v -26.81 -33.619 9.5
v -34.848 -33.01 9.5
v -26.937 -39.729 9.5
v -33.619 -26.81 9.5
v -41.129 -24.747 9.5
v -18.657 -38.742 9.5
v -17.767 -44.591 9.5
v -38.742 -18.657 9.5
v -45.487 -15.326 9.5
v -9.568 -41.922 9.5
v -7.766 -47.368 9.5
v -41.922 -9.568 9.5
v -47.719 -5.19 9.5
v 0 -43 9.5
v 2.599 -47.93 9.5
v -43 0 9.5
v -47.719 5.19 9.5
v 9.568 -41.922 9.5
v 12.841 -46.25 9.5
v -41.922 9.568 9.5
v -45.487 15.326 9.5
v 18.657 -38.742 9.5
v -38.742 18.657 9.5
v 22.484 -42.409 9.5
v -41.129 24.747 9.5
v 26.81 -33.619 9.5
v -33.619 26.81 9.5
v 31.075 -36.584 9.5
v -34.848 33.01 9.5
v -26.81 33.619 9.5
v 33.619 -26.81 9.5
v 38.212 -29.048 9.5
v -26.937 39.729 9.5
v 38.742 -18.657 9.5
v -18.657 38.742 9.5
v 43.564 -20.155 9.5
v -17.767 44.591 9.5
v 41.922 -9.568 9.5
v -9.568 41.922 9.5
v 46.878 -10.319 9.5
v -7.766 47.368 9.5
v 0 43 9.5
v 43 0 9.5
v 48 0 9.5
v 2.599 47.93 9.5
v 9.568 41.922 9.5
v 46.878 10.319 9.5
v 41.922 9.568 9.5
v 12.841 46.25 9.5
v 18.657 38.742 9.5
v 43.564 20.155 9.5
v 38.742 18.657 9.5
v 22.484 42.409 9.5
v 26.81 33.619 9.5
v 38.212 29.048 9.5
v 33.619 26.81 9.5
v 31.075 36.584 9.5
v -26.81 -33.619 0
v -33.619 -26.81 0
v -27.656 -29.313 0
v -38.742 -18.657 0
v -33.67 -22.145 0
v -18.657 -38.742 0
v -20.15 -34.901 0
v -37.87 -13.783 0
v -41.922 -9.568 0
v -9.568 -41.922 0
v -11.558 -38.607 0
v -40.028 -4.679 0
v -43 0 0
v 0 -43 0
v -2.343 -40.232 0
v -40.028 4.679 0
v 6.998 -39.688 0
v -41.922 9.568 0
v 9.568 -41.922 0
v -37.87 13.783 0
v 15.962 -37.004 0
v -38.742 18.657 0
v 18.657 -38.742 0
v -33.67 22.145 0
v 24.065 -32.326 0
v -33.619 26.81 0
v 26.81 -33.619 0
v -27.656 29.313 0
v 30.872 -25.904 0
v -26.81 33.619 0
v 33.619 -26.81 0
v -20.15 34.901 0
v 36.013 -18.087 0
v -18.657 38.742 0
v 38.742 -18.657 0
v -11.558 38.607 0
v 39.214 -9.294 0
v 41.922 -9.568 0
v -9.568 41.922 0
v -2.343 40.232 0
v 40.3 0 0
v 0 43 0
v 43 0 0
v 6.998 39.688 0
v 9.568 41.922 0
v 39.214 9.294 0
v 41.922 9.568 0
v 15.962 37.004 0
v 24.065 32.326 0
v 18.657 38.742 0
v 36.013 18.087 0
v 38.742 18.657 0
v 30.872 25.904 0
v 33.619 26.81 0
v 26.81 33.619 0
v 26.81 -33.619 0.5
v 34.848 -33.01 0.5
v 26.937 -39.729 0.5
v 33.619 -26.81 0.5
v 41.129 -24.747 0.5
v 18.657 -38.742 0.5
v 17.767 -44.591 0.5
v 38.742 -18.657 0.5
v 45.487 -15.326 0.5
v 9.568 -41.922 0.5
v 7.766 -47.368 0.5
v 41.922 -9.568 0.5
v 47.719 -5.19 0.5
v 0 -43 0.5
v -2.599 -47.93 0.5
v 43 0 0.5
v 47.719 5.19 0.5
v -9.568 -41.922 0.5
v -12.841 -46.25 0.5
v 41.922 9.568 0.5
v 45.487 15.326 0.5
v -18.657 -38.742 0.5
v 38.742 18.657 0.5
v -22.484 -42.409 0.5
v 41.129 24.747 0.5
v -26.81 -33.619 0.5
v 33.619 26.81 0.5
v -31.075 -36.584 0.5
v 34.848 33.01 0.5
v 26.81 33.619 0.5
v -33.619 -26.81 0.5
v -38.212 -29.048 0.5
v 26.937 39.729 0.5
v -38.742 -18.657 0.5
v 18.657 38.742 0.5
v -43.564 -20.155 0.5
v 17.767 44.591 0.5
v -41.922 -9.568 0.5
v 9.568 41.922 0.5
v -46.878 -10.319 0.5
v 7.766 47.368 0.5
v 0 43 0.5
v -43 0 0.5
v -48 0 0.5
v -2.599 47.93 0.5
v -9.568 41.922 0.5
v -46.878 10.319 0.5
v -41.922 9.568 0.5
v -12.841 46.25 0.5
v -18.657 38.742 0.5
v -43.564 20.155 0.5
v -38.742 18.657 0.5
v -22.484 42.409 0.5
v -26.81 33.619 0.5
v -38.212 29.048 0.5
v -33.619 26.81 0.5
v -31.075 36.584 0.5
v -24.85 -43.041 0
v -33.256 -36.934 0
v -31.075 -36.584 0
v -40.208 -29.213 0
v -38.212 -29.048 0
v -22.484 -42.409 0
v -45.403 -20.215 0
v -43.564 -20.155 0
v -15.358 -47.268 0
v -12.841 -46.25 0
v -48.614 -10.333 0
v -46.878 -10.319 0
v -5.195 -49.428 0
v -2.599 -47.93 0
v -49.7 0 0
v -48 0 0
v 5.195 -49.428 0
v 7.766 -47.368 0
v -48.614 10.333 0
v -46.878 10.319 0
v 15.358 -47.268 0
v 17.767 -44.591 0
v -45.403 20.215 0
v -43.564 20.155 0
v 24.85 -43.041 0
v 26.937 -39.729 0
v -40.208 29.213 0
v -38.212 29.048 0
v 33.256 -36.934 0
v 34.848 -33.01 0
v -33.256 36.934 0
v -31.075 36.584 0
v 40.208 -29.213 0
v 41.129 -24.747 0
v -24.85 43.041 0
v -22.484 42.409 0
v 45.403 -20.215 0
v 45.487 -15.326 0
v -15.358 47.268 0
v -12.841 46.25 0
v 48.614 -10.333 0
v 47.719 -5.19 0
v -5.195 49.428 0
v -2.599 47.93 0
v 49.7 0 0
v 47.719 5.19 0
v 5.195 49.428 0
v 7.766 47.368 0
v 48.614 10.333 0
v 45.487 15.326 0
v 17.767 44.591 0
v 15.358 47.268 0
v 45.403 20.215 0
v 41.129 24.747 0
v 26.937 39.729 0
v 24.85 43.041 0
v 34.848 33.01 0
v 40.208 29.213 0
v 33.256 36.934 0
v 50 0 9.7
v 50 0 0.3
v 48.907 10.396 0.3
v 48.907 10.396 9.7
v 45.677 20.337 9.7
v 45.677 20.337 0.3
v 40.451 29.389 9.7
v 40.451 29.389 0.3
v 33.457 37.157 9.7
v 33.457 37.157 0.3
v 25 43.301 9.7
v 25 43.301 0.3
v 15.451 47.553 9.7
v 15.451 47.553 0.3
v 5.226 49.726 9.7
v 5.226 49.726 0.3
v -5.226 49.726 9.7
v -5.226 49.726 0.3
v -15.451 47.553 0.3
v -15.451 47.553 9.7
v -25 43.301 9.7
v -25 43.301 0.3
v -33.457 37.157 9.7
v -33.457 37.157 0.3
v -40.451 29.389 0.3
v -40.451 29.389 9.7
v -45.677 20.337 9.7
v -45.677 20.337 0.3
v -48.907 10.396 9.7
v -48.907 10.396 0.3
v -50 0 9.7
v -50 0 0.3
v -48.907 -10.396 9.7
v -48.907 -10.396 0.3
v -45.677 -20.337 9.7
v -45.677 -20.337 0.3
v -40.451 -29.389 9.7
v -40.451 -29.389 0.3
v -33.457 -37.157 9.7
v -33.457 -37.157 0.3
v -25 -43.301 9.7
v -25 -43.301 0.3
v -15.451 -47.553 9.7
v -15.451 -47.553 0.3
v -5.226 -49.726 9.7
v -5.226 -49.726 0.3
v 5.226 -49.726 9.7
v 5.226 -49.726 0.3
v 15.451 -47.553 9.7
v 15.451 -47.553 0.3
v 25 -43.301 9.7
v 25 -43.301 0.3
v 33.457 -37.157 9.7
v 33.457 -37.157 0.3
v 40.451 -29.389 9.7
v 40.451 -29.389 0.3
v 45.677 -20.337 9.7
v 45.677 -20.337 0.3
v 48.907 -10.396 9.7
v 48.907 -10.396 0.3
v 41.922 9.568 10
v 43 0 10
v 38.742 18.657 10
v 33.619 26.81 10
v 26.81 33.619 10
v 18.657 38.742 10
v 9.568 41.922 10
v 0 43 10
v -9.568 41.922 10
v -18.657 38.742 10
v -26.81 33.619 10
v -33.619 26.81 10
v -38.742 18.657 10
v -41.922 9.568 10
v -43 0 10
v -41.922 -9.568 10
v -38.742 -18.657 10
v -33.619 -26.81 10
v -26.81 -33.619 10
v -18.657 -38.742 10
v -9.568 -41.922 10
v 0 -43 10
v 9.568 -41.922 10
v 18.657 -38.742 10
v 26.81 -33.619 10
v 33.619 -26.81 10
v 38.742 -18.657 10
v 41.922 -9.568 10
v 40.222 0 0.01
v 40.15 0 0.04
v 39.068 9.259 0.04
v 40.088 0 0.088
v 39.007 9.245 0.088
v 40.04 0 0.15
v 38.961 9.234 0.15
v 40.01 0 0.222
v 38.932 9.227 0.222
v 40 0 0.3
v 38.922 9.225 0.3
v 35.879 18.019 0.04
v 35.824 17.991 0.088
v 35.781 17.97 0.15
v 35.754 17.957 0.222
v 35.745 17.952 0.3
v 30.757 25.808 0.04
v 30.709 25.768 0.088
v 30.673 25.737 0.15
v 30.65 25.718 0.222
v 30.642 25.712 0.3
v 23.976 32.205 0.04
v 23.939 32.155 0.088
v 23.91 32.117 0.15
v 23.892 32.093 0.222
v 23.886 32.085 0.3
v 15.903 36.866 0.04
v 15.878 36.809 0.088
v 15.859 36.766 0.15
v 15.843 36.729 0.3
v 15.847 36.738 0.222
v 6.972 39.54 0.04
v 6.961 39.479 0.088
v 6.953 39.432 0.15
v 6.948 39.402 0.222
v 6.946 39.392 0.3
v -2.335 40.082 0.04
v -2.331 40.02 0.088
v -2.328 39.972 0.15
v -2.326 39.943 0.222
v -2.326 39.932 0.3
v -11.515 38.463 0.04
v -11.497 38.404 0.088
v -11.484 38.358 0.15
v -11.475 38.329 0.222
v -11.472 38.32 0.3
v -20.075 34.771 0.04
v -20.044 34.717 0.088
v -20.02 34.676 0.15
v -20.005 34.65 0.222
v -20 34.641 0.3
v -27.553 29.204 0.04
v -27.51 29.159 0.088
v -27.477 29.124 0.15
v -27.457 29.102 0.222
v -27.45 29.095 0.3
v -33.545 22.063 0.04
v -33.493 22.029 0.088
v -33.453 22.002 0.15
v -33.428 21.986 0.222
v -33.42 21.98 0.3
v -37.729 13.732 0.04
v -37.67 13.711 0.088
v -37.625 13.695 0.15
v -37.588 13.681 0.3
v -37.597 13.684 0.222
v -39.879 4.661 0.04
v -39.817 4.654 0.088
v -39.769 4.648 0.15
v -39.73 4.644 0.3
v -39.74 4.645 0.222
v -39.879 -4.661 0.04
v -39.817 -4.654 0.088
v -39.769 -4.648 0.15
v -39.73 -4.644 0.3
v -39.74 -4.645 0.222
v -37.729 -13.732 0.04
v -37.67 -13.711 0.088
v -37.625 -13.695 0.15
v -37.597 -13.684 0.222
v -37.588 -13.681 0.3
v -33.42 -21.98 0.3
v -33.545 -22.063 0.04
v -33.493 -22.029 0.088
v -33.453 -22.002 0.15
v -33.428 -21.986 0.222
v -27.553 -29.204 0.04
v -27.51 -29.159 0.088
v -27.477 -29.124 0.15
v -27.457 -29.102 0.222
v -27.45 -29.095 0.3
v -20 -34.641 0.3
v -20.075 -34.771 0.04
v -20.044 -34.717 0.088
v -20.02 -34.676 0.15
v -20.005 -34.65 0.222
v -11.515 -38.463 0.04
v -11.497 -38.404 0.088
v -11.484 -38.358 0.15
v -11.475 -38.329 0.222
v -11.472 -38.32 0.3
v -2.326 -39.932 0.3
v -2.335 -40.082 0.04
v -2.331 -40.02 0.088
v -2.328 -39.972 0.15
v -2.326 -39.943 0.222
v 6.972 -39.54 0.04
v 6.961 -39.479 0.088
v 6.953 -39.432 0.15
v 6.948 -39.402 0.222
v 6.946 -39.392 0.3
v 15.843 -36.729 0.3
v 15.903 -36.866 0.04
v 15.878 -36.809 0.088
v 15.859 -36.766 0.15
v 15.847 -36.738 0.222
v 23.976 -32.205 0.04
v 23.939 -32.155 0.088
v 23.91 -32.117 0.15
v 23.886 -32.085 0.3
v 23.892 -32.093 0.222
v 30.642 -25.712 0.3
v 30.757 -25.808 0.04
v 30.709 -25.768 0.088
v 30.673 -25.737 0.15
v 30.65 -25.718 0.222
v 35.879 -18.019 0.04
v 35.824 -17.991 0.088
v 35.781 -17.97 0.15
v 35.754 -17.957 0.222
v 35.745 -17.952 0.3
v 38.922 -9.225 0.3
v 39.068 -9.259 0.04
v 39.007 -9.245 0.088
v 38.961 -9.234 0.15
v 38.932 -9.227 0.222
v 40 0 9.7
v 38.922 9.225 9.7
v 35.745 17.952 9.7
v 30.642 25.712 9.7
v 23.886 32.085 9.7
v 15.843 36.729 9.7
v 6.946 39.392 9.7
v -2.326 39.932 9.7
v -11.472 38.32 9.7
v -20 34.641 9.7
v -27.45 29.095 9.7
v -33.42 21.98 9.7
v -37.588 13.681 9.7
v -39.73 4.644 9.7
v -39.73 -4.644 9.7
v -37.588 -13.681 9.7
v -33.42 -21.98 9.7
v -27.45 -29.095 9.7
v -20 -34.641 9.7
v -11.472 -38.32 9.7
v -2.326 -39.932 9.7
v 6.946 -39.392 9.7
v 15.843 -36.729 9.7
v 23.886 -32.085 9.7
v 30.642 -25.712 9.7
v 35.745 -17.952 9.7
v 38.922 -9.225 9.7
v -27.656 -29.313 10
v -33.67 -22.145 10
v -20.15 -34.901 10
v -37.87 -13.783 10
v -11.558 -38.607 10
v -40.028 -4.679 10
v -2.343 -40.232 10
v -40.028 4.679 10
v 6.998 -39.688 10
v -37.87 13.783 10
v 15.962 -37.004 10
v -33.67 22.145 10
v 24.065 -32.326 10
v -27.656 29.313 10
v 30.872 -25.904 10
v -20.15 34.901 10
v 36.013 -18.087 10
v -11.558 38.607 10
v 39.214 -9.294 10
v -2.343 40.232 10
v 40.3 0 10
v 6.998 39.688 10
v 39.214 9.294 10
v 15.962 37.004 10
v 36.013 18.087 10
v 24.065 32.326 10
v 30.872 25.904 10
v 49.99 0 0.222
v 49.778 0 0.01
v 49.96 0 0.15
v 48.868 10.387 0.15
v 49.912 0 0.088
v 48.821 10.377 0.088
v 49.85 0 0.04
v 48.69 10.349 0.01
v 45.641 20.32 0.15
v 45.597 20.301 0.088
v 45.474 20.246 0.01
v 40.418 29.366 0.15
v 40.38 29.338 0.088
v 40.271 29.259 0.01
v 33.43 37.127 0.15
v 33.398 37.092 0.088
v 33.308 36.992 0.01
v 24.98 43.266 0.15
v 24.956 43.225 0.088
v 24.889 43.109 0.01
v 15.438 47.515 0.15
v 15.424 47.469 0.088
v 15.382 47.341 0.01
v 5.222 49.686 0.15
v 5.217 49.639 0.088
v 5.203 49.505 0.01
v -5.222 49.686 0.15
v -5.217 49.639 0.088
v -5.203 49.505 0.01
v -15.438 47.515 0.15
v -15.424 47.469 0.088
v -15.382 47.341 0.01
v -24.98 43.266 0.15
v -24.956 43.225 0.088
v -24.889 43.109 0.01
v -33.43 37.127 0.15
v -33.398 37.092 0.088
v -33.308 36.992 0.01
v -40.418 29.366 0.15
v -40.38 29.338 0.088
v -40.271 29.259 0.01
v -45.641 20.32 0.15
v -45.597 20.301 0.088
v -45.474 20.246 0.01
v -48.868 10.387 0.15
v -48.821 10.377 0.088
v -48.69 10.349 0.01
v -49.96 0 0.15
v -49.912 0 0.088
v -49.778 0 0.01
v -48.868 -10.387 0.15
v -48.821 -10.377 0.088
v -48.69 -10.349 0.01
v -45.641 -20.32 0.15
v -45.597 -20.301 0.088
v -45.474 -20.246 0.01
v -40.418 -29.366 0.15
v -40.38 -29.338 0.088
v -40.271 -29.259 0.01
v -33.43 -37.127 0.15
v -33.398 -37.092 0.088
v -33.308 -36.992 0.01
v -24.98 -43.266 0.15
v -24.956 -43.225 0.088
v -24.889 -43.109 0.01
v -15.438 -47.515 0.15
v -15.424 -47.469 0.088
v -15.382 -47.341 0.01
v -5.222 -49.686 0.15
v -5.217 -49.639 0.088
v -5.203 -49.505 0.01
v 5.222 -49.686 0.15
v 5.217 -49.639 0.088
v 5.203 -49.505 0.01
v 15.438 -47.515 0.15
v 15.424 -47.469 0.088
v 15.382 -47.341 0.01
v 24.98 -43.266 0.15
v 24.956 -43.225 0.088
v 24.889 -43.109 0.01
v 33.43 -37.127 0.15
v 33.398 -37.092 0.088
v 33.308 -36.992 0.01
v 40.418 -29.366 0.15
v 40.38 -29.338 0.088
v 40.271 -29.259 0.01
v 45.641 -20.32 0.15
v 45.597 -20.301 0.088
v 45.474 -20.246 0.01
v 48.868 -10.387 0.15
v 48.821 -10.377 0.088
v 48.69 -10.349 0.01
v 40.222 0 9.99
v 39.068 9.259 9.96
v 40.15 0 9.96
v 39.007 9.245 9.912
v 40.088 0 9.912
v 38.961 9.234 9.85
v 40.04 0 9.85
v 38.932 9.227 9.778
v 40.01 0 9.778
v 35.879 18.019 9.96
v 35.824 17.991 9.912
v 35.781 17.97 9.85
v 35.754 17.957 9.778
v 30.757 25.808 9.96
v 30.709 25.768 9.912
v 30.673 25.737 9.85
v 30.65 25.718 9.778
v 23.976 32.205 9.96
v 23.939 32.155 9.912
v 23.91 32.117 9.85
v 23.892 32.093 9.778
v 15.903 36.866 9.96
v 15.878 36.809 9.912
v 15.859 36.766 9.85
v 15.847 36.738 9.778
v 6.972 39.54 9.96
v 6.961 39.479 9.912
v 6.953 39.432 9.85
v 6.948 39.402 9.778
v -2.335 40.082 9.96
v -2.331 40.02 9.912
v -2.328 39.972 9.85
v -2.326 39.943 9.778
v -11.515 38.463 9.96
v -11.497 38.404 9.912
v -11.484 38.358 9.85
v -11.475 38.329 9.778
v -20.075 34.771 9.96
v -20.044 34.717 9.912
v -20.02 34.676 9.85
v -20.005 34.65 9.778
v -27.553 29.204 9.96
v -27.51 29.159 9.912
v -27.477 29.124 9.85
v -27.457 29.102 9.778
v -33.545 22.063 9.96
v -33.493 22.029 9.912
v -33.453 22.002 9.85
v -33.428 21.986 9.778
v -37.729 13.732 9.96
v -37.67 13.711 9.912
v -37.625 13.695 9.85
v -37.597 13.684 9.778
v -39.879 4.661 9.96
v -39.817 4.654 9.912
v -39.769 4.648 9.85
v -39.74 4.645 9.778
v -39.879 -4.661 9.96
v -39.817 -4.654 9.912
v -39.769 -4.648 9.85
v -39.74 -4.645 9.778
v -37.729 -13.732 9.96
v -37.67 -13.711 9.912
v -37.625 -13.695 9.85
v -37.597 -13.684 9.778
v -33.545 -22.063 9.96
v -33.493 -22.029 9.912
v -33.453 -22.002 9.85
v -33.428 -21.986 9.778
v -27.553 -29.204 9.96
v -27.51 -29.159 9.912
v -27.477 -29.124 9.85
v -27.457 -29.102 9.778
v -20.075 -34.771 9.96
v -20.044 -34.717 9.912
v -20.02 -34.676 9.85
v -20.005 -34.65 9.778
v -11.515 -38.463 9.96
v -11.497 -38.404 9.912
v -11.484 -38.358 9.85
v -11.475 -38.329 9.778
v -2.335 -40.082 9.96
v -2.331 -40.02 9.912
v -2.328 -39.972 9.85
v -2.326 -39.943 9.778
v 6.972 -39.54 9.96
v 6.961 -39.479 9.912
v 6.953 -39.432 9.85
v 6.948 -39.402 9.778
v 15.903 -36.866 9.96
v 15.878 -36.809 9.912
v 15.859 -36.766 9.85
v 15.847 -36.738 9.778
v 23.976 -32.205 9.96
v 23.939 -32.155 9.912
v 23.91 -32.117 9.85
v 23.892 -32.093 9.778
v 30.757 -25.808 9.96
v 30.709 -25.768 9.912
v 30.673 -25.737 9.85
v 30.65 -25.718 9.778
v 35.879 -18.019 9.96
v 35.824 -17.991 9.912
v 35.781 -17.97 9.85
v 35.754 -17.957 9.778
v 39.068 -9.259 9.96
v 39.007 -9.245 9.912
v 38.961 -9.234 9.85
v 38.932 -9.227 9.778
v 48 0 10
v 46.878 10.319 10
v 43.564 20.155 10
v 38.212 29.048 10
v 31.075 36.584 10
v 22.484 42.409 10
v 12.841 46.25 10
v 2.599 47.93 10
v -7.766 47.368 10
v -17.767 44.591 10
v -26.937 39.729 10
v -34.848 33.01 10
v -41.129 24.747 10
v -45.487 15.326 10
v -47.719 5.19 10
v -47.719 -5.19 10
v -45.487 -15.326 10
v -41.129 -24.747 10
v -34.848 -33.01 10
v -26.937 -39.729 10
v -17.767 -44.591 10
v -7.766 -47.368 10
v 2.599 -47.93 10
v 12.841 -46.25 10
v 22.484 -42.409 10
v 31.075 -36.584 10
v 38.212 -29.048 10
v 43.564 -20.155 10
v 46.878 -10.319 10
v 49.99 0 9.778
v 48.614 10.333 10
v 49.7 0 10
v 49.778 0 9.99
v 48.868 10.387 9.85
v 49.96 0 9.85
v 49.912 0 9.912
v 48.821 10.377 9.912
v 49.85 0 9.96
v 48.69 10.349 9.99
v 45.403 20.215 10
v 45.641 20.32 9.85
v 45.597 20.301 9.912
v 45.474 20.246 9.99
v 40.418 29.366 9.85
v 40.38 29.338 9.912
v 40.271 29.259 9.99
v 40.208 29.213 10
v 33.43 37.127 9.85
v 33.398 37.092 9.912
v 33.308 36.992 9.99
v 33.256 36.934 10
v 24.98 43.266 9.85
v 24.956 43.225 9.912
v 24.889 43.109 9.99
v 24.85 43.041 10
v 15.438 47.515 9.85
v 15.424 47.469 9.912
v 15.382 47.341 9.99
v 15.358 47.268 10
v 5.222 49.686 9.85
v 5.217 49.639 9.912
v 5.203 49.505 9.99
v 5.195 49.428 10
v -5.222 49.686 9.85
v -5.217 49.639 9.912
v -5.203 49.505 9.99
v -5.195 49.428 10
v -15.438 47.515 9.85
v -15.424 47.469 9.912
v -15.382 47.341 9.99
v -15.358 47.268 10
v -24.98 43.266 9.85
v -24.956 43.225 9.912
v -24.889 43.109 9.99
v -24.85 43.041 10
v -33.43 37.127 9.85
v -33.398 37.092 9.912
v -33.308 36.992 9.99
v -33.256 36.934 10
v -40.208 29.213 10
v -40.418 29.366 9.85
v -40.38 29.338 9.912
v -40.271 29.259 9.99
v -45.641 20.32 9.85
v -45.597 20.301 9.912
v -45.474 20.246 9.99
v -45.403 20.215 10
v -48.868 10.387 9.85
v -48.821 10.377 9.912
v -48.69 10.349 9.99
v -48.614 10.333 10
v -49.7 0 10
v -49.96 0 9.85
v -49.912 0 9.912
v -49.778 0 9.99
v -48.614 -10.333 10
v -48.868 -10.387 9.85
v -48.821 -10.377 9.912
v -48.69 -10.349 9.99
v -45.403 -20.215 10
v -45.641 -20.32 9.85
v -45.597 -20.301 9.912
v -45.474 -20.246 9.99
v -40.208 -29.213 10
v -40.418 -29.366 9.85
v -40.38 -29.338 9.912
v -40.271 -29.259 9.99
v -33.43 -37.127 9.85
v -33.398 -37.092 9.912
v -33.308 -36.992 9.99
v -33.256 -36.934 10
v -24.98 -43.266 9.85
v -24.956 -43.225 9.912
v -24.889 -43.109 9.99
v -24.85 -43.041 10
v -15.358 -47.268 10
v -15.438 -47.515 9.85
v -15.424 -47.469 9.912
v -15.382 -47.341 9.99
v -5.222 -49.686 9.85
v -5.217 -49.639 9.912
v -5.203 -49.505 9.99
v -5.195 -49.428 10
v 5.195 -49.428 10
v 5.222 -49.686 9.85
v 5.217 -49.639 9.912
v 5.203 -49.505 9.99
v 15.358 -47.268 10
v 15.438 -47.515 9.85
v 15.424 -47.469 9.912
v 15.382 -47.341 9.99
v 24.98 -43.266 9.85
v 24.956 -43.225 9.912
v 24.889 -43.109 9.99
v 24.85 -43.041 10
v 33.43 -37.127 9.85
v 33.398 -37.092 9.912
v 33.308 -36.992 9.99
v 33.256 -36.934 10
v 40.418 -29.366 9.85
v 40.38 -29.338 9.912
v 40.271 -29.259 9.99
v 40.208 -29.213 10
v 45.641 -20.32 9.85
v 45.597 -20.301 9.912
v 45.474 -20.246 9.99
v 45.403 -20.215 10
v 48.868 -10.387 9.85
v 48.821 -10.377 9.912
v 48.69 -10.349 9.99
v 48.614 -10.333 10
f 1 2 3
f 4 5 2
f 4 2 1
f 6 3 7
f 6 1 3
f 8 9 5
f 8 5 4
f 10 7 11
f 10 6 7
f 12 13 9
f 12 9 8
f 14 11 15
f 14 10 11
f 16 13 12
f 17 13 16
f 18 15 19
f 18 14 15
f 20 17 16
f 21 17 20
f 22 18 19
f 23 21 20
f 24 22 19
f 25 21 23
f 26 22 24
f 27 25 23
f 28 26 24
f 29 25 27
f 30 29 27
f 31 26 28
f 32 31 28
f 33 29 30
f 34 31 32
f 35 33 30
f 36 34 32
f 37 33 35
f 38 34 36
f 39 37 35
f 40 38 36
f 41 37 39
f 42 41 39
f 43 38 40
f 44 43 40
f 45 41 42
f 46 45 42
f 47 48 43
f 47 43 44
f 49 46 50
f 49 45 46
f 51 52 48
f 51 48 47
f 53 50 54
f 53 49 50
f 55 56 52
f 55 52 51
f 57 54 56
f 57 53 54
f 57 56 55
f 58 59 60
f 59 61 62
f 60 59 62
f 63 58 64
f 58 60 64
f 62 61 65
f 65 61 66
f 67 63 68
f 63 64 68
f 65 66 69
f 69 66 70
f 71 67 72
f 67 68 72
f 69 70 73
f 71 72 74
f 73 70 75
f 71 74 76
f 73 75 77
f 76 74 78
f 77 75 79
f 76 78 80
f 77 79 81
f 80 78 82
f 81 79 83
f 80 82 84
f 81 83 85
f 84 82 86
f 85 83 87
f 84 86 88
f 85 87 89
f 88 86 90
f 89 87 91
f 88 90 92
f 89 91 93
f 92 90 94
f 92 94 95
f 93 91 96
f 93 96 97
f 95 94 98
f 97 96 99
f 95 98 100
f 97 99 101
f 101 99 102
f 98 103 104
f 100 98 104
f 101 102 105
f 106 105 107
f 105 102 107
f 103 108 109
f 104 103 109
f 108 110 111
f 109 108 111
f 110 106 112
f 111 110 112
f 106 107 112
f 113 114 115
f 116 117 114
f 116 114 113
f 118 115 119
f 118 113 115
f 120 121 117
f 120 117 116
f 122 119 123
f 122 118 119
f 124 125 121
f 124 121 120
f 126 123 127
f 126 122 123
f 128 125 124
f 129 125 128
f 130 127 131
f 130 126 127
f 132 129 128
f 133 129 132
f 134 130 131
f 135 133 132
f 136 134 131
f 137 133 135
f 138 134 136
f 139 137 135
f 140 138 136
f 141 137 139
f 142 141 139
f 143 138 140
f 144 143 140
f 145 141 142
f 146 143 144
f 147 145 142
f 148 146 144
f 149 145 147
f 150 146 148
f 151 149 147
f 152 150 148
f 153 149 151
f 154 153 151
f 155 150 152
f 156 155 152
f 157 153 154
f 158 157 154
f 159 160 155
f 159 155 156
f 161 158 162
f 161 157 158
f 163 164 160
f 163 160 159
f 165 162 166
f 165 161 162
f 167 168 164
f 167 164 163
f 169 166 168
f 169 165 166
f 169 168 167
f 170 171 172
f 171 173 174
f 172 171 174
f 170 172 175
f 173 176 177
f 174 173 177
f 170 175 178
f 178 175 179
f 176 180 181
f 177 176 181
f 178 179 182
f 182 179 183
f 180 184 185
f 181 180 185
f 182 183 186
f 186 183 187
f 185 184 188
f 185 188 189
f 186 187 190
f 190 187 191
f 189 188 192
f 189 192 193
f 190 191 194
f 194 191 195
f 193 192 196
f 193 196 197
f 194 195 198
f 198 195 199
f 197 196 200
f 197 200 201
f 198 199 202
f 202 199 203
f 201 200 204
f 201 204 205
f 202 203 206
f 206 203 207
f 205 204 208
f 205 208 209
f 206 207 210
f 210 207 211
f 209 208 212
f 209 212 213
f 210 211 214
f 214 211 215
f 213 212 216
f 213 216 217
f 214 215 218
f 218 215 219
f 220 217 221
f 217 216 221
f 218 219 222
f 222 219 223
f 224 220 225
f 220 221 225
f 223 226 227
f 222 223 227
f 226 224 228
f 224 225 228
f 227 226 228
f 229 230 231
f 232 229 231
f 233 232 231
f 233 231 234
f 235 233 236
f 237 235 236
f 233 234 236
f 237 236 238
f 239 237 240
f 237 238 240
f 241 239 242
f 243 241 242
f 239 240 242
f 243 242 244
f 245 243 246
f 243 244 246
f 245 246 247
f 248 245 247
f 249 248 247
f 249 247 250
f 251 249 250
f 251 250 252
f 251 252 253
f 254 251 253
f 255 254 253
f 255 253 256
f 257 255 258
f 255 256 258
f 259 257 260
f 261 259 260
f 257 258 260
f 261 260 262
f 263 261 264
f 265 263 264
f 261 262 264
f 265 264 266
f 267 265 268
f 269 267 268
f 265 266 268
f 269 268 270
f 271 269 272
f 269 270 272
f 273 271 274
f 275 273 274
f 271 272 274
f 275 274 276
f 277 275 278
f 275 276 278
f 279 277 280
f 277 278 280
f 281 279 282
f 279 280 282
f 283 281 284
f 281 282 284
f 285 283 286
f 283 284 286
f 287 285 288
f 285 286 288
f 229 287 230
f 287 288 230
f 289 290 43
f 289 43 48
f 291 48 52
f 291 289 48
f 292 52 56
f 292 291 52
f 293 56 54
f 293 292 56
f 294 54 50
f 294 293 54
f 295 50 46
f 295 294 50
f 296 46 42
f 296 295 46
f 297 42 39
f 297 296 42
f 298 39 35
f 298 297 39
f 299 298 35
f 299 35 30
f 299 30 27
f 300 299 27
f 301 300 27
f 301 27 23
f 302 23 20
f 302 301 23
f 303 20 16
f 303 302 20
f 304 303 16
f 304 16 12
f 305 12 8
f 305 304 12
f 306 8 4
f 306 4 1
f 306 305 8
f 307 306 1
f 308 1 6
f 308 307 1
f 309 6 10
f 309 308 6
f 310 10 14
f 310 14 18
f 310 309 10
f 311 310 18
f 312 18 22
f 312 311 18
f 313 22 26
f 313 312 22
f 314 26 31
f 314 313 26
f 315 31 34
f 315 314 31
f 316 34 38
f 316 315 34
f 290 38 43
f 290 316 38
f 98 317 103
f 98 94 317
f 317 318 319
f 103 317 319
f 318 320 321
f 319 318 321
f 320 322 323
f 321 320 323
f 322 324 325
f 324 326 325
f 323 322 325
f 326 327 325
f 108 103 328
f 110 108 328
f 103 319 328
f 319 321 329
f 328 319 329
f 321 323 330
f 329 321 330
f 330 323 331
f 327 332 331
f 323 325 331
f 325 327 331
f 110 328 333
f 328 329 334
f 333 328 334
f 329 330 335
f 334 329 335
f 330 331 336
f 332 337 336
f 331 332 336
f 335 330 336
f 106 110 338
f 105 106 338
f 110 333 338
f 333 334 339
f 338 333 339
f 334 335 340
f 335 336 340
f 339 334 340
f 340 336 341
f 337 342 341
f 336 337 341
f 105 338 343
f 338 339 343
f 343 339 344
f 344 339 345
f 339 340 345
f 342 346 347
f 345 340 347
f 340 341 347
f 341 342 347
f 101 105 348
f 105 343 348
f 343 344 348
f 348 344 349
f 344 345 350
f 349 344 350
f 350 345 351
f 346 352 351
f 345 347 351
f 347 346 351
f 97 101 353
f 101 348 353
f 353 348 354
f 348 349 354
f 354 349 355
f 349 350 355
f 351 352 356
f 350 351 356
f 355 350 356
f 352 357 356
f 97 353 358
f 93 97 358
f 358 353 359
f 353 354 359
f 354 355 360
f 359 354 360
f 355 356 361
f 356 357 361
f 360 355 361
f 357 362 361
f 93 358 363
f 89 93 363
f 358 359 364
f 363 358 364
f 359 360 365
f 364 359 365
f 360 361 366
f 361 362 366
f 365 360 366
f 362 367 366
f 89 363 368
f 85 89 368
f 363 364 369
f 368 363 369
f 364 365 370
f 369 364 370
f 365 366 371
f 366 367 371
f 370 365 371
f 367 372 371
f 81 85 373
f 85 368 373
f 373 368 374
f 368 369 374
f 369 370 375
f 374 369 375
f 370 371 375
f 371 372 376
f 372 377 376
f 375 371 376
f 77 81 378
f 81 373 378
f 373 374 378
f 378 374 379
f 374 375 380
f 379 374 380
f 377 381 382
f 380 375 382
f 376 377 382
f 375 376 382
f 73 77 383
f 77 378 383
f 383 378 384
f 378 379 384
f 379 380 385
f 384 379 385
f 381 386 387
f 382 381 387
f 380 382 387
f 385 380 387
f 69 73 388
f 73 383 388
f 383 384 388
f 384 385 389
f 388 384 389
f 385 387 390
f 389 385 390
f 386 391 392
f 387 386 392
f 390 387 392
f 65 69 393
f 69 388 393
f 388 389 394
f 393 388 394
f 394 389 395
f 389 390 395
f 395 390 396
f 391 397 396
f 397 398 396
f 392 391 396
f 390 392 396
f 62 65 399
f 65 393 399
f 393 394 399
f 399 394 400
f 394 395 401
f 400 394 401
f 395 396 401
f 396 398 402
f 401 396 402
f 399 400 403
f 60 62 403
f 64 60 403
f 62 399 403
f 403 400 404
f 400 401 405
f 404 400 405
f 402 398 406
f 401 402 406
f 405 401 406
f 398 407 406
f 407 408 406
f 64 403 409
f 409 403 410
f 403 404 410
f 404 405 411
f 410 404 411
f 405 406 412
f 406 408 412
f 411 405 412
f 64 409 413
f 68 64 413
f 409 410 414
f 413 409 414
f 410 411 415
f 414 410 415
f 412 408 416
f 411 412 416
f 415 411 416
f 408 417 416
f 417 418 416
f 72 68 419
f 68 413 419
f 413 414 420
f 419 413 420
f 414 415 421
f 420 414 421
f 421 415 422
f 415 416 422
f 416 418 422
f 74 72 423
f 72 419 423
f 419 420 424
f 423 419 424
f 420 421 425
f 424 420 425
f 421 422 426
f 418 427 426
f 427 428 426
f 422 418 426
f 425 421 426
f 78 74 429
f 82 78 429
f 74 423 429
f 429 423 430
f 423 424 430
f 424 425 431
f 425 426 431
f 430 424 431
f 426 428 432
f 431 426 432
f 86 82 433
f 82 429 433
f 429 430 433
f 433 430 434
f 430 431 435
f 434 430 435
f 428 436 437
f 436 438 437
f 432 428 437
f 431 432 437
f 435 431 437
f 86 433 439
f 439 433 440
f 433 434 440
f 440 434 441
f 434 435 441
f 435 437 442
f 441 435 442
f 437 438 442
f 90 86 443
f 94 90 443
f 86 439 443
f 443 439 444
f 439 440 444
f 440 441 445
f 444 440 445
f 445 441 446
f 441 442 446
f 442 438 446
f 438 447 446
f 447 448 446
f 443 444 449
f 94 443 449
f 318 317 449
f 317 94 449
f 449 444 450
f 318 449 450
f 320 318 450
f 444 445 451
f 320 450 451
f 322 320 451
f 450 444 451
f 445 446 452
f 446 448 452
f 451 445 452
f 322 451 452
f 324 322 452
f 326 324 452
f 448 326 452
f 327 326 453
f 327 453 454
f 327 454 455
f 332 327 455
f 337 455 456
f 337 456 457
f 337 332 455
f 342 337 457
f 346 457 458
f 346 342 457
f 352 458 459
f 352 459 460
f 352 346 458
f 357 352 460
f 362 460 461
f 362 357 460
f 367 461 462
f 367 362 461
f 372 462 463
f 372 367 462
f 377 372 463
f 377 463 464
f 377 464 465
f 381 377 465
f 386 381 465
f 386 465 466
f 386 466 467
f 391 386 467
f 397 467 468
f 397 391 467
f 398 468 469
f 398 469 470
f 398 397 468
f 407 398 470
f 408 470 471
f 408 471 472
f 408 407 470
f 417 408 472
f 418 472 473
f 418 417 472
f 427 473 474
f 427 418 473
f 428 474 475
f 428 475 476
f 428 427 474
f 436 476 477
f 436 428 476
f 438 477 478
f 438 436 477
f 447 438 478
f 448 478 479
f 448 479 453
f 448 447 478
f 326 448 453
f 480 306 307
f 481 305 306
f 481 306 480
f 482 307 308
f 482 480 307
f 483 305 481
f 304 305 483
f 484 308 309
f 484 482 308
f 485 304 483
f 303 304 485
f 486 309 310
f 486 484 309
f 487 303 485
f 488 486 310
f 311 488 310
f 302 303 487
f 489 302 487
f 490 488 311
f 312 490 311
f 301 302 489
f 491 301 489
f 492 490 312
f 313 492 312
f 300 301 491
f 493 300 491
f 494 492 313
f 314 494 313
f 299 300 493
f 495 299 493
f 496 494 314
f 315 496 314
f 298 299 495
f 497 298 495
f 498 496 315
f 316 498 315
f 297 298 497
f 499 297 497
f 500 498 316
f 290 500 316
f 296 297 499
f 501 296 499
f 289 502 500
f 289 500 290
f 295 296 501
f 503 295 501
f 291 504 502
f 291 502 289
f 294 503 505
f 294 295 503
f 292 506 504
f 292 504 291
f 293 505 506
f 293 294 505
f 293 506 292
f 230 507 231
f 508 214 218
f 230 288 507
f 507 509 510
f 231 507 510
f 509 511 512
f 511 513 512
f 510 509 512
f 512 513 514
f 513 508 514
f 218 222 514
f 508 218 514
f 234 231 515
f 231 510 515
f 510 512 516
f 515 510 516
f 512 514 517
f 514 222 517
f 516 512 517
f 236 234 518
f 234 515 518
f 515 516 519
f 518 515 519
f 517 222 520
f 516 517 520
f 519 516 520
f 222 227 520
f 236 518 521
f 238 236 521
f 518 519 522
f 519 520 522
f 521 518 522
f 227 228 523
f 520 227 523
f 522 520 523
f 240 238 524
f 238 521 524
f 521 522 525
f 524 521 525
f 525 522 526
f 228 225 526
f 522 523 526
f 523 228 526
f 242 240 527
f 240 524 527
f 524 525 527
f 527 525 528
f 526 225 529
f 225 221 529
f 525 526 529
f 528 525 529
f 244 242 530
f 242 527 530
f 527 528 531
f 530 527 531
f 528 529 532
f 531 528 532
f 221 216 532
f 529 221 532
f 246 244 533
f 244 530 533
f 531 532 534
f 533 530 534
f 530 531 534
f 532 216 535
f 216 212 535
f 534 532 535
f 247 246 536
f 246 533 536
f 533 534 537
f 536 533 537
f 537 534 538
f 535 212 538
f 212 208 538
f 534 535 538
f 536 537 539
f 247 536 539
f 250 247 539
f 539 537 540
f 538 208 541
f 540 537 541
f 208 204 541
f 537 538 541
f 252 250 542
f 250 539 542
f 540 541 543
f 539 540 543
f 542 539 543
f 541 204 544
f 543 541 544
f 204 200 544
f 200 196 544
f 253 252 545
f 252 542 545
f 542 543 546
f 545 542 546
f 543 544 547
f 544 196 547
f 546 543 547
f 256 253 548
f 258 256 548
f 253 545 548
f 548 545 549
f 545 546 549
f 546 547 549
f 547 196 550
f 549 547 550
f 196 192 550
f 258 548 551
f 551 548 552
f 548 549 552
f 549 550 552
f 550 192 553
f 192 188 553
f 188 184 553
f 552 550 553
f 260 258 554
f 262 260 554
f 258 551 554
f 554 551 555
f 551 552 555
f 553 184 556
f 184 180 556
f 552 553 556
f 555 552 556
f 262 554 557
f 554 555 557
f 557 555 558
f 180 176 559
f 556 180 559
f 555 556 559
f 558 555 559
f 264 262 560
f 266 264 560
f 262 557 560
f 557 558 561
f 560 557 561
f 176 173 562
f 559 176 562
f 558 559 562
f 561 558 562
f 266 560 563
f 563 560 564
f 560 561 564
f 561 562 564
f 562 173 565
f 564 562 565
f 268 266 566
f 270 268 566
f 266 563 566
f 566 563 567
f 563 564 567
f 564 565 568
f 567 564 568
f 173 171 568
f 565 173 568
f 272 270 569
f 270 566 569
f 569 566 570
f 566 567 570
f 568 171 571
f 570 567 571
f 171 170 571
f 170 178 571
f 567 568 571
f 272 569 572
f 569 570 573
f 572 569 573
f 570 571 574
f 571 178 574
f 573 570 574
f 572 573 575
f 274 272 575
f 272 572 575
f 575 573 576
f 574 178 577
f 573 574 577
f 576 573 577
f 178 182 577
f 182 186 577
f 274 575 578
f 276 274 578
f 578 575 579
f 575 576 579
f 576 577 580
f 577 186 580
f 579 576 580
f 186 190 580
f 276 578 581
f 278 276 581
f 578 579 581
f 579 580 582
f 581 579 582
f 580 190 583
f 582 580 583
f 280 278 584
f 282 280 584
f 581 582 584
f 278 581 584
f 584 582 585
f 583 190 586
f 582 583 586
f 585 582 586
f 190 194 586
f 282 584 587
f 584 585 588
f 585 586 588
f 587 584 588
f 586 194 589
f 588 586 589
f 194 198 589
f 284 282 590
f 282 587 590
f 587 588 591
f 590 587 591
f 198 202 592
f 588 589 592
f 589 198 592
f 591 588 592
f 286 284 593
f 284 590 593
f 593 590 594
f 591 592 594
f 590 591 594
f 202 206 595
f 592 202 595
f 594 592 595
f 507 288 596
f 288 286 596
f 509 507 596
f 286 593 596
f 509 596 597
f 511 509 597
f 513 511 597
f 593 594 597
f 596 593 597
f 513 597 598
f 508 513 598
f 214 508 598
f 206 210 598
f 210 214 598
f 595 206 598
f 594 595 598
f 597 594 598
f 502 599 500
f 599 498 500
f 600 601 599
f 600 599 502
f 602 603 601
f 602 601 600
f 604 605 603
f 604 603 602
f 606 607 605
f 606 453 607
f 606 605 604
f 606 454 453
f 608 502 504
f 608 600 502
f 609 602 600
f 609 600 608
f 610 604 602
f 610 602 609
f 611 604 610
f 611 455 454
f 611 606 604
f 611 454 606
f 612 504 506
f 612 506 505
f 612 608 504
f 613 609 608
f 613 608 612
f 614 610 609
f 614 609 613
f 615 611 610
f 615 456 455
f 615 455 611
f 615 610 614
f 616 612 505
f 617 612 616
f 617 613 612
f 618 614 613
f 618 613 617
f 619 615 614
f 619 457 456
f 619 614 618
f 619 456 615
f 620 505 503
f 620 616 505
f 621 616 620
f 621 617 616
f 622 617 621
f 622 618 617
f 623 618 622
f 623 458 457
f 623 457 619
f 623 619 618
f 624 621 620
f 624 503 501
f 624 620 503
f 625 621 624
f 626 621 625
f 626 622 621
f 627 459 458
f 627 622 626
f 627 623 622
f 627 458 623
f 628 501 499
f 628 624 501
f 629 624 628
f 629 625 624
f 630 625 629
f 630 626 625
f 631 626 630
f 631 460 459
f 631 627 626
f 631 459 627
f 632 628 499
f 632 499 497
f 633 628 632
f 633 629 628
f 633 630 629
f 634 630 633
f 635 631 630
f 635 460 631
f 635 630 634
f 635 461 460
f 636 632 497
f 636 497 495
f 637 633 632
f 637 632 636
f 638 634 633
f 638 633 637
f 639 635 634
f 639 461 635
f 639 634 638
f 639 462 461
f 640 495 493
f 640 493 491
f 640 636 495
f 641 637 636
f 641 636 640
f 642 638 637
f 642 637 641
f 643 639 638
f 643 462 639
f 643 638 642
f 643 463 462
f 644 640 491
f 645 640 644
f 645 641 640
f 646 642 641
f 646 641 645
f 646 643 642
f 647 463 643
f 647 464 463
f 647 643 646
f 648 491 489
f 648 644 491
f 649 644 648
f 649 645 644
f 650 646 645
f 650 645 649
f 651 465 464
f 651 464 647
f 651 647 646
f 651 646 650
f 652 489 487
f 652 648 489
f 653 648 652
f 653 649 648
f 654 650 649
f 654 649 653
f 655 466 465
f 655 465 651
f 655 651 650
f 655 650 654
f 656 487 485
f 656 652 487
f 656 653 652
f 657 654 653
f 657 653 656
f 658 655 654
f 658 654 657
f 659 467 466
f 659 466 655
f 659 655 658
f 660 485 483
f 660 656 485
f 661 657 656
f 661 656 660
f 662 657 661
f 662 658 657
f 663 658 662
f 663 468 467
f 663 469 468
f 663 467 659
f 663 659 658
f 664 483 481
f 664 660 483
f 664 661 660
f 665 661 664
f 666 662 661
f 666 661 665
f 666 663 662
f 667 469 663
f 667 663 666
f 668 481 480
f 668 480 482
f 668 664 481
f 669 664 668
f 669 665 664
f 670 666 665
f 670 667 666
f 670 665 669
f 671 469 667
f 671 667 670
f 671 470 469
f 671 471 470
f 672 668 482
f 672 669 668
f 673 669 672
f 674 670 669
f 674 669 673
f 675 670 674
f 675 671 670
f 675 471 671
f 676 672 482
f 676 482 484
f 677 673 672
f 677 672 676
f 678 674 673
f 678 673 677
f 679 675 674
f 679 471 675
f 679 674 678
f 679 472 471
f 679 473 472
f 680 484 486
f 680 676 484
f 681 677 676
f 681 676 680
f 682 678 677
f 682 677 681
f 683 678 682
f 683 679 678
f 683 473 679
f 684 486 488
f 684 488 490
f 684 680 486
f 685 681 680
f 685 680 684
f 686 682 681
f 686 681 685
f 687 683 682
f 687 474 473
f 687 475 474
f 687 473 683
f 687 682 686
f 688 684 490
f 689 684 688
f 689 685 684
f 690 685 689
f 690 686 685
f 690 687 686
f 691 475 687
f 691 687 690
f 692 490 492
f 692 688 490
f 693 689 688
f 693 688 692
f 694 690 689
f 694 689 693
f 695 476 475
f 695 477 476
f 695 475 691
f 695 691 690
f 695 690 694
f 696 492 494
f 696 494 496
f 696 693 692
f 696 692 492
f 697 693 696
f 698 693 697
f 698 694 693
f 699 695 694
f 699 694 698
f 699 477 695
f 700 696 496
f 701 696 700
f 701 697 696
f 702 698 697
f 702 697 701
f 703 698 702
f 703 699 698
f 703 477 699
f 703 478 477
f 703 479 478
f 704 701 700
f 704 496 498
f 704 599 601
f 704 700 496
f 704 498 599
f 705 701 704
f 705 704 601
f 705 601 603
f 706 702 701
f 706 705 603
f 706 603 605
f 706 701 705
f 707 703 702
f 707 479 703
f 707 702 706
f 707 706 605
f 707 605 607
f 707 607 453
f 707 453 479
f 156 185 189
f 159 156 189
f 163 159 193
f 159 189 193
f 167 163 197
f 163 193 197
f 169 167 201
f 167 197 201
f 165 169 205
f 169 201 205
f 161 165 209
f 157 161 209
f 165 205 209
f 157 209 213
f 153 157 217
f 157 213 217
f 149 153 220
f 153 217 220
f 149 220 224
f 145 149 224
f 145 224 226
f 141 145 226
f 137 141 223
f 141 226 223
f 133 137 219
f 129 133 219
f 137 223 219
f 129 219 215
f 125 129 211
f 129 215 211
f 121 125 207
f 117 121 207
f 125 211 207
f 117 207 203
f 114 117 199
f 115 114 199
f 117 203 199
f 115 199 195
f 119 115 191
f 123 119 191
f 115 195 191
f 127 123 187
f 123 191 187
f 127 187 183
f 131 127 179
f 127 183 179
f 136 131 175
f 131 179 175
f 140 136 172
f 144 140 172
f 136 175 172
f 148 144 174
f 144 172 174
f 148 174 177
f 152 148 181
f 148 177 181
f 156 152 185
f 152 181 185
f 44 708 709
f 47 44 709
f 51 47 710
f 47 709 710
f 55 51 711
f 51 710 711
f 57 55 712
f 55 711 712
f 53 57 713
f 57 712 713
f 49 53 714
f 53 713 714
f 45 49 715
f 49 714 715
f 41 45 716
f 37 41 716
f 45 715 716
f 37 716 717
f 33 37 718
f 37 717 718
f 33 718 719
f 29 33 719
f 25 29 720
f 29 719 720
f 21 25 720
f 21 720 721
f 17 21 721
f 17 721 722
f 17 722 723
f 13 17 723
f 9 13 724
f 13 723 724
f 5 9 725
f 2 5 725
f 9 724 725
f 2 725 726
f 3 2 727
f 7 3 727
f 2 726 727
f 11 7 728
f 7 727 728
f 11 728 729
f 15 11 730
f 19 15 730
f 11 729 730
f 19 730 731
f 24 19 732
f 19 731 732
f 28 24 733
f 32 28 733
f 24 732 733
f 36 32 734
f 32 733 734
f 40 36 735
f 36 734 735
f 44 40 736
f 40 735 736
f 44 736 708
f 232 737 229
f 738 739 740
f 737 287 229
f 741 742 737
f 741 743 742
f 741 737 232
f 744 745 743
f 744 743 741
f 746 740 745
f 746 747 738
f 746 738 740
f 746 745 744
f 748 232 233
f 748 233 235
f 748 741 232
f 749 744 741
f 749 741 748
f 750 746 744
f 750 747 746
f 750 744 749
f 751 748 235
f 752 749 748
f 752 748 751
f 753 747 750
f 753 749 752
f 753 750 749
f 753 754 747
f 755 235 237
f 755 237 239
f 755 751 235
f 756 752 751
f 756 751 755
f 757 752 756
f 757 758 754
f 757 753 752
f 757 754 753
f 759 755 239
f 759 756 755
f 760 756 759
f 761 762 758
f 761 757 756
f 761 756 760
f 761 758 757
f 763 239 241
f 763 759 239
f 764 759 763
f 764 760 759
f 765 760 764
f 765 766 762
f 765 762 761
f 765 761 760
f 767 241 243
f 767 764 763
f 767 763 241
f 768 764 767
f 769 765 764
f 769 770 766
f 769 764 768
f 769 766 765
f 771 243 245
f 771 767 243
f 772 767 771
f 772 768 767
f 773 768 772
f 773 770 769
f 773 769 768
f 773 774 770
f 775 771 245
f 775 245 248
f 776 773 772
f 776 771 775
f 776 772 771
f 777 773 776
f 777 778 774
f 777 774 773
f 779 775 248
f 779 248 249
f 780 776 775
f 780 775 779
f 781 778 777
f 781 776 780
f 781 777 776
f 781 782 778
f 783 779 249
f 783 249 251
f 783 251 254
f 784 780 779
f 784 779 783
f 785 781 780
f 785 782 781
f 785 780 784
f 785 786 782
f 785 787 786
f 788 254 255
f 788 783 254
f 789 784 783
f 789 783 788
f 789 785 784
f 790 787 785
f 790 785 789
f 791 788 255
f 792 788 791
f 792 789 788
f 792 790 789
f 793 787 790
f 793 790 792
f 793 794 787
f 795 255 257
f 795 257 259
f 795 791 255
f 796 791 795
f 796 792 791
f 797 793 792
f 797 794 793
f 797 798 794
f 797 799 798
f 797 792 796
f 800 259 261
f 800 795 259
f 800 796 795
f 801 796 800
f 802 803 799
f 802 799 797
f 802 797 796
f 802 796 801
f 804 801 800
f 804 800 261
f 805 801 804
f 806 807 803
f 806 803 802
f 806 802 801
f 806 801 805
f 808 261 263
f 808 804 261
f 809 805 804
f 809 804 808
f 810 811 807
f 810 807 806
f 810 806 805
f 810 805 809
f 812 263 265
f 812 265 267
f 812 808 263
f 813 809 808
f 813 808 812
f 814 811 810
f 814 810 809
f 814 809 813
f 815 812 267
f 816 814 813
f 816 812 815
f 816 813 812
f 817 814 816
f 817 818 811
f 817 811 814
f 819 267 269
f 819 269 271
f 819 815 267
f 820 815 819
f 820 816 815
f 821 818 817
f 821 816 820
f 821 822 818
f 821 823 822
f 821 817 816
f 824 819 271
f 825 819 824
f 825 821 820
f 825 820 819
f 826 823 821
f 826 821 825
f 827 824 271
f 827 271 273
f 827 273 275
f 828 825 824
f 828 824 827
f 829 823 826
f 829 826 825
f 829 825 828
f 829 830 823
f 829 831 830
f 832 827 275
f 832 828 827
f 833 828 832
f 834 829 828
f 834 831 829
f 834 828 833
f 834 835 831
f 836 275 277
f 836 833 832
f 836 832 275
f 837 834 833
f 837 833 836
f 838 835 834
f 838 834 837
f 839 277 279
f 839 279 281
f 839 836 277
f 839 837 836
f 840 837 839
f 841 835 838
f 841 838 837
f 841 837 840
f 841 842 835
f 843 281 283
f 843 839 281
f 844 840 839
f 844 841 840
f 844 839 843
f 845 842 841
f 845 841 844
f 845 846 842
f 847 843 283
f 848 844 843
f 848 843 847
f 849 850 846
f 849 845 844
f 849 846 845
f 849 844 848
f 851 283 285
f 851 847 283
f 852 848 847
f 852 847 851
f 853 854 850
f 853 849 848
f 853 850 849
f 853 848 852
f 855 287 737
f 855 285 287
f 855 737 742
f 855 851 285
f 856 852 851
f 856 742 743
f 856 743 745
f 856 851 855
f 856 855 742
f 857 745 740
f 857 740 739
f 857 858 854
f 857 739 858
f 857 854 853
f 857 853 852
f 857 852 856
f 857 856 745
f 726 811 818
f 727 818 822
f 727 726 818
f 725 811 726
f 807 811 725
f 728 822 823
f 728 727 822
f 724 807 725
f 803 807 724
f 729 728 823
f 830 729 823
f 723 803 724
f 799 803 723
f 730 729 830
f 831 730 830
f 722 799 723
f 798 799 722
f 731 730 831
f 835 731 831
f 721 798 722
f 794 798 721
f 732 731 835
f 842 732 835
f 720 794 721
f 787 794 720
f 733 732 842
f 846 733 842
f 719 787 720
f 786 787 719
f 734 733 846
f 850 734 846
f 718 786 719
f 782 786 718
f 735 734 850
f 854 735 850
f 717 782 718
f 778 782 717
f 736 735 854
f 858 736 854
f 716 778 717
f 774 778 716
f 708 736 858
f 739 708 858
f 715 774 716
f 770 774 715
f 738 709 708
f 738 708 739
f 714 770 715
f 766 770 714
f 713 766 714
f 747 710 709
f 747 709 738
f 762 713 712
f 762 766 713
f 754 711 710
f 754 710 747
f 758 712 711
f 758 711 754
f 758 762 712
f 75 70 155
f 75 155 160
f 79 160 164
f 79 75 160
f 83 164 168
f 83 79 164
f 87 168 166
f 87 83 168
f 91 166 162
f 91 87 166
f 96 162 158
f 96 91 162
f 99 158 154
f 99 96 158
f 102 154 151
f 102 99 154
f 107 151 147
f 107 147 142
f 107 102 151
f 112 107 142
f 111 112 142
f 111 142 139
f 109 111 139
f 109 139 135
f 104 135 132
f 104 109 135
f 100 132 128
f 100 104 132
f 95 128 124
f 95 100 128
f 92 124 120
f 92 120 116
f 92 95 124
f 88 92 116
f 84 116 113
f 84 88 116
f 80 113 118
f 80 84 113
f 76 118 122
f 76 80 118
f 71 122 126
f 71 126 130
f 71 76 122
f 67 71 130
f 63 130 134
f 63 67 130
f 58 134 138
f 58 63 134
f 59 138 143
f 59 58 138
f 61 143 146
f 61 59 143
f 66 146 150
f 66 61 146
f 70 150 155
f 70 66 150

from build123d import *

# Parameters (mm, degrees)
ESQUISSE1_R             = 50
ESQUISSE1_R_2           = 40
BOSS_EXTRU_1_DEPTH      = 10
ESQUISSE2_R             = 48
ESQUISSE2_R_2           = 43
ENL_V_MAT_EXTRU_1_DEPTH = 0.5
ESQUISSE3_R             = 48
ESQUISSE3_R_2           = 43
ENL_V_MAT_EXTRU_2_DEPTH = 0.5
CONG_1_R                = 0.3


with BuildPart() as part:
    # Esquisse1 → Boss.-Extru.1 (new body)
    with BuildSketch(Plane.XY):
        Circle(ESQUISSE1_R)
        Circle(ESQUISSE1_R_2, mode=Mode.SUBTRACT)
    extrude(amount=BOSS_EXTRU_1_DEPTH)

    # Esquisse2 → Enlèv. mat.-Extru.1 (cut)
    with BuildSketch(Plane.XY.offset(10)):
        Circle(ESQUISSE2_R)
        Circle(ESQUISSE2_R_2, mode=Mode.SUBTRACT)
    extrude(amount=-ENL_V_MAT_EXTRU_1_DEPTH, mode=Mode.SUBTRACT)

    # Esquisse3 → Enlèv. mat.-Extru.2 (cut)
    with BuildSketch(Plane(origin=(0, 0, 0), x_dir=(-1, 0, 0), z_dir=(0, 0, -1))):
        Circle(ESQUISSE3_R)
        Circle(ESQUISSE3_R_2, mode=Mode.SUBTRACT)
    extrude(amount=-ENL_V_MAT_EXTRU_2_DEPTH, mode=Mode.SUBTRACT)

    # Congé1
    cong_1_edges = [part.edges().sort_by_distance(p)[0] for p in [
        (-50, 0, 0),
        (-50, 0, 10),
        (-40, 0, 0),
        (-40, 0, 10),
    ]]
    fillet(cong_1_edges, radius=CONG_1_R)


solid = part.part
